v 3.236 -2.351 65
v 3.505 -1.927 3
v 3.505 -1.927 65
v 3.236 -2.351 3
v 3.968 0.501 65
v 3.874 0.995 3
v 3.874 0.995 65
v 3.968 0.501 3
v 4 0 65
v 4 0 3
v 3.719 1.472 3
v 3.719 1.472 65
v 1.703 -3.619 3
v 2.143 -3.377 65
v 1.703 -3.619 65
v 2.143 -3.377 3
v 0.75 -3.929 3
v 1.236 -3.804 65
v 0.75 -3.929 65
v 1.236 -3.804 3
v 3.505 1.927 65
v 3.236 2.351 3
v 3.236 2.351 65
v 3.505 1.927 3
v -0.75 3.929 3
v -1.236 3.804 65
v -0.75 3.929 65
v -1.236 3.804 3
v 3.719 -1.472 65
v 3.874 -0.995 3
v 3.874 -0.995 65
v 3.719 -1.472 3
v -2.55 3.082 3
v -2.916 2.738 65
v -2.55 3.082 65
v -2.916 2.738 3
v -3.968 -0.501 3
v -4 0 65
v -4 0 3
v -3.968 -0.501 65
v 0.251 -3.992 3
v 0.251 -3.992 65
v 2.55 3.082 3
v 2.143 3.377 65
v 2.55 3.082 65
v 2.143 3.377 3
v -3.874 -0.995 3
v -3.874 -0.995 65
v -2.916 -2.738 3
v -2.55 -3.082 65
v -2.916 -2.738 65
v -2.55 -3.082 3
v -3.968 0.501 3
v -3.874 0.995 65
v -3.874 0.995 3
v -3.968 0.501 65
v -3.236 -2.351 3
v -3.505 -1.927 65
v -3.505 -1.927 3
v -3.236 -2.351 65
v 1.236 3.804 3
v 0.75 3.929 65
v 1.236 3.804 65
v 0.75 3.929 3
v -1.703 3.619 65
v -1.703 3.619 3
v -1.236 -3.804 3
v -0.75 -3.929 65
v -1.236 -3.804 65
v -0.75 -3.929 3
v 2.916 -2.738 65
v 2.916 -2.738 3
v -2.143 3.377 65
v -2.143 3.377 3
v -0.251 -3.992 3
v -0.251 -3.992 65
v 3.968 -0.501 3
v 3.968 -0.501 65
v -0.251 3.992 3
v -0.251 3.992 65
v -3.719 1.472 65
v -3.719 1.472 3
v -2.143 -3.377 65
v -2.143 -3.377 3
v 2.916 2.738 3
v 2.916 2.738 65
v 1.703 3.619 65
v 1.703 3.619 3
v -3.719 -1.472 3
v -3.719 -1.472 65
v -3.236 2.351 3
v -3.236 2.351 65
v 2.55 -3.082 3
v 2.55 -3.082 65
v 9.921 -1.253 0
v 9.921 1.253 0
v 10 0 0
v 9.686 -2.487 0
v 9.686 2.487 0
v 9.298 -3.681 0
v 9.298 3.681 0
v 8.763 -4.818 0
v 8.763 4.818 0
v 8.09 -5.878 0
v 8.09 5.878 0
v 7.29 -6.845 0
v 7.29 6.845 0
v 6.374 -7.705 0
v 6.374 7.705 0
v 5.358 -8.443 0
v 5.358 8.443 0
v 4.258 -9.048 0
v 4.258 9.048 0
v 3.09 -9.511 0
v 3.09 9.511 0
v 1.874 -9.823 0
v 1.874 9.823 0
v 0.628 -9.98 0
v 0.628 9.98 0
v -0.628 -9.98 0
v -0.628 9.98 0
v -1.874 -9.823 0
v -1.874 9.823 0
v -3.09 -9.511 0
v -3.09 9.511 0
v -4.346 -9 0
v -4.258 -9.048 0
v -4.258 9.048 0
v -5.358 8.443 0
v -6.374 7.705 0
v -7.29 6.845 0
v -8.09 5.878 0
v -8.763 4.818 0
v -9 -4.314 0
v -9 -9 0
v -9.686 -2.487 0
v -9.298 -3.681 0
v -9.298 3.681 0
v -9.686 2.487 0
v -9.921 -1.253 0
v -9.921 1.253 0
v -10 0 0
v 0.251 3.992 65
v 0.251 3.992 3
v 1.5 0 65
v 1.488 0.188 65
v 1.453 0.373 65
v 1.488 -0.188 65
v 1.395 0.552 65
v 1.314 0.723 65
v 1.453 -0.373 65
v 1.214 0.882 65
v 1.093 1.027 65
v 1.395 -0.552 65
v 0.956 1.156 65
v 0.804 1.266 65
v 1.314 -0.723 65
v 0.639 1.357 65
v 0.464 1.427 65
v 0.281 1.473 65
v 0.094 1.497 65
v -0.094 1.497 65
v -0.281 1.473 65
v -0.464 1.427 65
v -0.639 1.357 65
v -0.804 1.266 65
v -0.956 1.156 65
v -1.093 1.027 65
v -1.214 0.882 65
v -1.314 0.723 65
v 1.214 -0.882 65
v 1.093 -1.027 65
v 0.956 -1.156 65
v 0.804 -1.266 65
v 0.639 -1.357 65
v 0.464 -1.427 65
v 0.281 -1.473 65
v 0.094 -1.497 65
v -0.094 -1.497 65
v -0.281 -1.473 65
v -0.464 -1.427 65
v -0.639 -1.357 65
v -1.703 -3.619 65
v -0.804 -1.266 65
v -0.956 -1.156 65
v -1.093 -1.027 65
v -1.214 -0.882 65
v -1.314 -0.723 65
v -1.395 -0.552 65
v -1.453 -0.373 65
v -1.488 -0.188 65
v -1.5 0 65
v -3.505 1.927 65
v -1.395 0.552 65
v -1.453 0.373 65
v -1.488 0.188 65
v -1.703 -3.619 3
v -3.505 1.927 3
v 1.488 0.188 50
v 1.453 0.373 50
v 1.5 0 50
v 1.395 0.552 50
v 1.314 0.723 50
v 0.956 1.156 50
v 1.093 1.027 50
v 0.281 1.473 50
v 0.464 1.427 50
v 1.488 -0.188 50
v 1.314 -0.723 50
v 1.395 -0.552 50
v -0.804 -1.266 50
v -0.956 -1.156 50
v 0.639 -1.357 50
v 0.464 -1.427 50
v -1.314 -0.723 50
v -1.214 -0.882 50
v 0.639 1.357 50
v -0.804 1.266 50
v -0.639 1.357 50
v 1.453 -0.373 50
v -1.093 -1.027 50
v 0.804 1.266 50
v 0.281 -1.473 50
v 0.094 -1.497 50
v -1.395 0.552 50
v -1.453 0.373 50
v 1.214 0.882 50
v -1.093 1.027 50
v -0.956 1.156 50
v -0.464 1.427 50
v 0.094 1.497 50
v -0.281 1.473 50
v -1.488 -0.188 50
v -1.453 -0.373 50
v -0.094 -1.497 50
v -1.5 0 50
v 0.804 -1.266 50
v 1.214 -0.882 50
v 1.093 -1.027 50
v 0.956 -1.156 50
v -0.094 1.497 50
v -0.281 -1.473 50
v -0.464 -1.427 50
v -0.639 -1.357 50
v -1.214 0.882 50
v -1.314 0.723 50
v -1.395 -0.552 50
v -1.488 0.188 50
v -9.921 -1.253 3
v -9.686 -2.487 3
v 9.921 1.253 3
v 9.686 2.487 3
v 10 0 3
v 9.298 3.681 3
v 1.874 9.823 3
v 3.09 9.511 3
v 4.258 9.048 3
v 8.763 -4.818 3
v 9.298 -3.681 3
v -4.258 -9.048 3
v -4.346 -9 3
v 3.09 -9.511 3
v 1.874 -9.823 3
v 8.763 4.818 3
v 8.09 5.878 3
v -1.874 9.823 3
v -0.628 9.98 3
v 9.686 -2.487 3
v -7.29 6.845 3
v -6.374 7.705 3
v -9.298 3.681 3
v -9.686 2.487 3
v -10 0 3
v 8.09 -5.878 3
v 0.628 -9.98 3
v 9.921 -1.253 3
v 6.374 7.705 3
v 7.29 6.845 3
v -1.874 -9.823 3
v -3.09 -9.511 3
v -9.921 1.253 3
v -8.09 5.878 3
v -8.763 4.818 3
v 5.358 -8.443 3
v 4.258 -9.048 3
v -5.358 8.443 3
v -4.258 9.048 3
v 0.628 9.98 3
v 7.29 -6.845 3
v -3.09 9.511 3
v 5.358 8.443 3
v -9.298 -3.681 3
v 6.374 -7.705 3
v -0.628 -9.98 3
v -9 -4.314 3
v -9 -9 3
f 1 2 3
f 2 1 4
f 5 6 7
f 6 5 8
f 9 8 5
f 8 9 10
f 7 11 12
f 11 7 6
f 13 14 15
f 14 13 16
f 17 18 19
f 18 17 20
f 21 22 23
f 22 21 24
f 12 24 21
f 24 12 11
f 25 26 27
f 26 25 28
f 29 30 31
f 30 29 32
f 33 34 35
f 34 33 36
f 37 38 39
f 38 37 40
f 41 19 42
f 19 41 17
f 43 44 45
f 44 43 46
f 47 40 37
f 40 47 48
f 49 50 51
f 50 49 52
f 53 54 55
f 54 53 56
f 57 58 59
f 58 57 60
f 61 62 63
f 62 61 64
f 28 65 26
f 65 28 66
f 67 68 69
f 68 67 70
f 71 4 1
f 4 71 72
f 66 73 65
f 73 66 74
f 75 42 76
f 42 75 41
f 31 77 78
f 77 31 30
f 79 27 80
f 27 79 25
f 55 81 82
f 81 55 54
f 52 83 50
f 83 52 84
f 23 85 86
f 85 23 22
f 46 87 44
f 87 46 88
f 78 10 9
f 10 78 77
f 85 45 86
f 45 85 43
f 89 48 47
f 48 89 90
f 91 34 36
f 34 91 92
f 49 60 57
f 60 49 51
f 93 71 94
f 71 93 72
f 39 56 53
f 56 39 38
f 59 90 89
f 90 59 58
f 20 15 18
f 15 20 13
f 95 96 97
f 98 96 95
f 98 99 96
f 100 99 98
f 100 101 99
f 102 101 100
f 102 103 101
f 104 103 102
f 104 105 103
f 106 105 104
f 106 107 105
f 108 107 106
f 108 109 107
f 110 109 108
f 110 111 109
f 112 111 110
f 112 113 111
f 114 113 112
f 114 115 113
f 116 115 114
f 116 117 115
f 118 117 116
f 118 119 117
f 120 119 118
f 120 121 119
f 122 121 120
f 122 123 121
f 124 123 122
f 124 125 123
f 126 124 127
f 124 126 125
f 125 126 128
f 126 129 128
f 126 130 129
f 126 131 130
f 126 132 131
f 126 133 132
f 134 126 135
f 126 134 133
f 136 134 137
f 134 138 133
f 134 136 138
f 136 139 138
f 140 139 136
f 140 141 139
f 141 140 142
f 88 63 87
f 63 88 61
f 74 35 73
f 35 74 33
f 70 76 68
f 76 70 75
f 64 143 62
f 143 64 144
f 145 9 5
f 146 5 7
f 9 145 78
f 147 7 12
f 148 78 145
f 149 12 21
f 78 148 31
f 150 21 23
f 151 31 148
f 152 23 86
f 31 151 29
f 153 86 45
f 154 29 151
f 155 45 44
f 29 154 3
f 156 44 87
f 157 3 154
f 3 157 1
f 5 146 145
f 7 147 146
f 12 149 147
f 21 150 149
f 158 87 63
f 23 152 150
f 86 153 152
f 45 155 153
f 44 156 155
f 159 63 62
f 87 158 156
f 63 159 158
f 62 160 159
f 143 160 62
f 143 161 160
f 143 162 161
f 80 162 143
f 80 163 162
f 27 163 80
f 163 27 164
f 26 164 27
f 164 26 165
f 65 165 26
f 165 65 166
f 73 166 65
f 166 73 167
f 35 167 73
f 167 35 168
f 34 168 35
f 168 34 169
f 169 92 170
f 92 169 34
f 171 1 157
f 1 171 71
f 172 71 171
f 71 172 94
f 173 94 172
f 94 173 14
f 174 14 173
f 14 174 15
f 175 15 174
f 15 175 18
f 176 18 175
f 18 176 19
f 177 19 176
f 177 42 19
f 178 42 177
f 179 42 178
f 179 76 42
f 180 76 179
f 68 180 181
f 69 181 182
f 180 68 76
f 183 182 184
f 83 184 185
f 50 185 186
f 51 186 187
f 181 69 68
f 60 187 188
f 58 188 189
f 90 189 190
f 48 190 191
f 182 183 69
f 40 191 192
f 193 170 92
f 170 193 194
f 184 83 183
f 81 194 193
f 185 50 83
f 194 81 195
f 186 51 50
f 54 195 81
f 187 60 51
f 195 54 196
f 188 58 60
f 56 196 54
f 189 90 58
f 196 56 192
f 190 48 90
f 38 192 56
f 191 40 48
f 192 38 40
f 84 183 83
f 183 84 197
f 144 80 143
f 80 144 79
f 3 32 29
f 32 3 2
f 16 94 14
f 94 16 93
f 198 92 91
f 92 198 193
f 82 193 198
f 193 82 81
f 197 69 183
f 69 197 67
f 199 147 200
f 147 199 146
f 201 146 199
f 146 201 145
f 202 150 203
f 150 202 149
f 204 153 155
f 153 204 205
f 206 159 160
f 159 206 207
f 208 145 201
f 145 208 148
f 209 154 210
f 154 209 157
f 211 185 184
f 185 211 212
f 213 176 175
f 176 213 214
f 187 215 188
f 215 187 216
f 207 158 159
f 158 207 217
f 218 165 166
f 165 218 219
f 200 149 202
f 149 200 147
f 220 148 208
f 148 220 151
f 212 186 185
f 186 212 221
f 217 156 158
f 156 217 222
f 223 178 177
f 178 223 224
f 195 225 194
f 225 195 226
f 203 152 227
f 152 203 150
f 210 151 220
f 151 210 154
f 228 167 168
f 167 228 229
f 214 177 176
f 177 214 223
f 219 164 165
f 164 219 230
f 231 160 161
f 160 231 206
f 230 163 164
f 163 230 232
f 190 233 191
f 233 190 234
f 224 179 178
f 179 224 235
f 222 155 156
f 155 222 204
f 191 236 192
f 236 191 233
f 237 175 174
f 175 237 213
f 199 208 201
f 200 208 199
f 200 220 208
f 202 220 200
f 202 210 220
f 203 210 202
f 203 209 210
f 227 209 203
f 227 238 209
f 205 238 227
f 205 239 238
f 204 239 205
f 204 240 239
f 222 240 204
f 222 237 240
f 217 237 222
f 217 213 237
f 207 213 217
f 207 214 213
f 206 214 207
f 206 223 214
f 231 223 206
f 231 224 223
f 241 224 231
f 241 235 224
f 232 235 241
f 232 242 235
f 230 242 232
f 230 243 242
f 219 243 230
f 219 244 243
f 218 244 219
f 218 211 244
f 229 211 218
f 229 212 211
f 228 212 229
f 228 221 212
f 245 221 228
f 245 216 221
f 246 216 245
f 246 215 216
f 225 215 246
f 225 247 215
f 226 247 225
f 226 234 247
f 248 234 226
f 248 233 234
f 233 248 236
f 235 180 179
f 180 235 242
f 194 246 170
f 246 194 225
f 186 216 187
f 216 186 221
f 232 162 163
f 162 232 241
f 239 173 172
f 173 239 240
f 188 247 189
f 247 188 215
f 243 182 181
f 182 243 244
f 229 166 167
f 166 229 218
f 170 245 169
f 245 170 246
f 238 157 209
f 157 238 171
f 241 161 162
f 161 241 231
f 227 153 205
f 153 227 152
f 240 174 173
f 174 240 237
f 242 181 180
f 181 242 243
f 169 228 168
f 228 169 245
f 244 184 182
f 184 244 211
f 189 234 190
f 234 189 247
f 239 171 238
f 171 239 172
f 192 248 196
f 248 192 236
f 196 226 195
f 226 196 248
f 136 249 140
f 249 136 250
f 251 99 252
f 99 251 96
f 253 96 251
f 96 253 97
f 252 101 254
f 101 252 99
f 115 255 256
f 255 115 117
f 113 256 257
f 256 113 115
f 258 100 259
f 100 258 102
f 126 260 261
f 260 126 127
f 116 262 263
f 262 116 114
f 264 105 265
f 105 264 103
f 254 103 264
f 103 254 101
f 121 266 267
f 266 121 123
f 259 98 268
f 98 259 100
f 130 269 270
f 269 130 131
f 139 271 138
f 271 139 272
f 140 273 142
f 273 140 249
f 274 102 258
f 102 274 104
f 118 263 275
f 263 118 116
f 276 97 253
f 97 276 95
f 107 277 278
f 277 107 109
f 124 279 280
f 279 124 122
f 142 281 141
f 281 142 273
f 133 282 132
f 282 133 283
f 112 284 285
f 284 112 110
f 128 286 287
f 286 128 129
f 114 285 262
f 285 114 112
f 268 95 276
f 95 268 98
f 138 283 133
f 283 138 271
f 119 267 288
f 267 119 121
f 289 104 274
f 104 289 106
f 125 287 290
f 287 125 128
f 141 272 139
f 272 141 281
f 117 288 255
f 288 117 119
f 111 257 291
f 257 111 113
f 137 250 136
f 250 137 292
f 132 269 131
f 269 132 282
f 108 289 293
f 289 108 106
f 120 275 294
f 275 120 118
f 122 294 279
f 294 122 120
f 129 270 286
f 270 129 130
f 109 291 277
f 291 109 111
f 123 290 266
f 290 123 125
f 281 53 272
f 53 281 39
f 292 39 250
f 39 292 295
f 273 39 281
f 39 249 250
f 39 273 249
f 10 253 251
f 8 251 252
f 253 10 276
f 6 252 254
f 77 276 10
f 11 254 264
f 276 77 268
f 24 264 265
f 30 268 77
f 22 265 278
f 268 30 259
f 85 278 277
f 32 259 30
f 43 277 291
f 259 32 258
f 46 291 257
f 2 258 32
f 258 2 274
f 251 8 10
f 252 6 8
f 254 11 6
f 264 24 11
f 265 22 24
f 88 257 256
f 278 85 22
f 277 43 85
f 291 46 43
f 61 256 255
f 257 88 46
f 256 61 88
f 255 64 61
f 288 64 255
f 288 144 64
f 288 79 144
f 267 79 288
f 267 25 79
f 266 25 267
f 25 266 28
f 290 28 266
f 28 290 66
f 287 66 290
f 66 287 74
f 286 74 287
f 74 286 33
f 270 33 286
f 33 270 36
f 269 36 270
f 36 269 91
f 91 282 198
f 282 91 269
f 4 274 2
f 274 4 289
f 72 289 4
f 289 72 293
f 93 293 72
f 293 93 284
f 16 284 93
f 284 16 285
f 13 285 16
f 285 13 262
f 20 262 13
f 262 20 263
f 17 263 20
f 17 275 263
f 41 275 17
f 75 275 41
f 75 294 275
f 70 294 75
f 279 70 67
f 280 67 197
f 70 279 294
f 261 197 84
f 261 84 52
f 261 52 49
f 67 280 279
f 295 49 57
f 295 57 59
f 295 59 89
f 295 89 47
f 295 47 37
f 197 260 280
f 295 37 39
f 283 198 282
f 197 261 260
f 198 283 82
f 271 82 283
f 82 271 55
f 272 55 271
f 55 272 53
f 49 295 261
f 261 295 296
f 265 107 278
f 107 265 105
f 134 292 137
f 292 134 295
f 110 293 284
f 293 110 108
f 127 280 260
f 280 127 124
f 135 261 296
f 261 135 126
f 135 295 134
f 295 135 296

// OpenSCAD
// knob for z axis

$fn=5*10;


//Total Dial Length mm
Length=65;

//Thickness of the dial head in mm
Dial=3;

// Knob add ons
add ="pointer"; //[none,pointer,knurled]

cylinder(h=Dial,r=10);

if (add=="knurled")
{
  for ( i = [0 : 10] )
  {
      translate([sin(i*36)*9,cos(i*36)*9, 0]) cylinder(h=Dial,r=3);
  }
}

if (add=="pointer")
{
    translate([-9,-9,0]) linear_extrude(height=Dial) polygon(points=[[0,0],[7,0],[0,7]], paths=[[0,1,2]]);
}

difference () {
cylinder(h=Length,r=4);
translate([0,0,Length-15]) cylinder(h=20,r=1.5);
}
